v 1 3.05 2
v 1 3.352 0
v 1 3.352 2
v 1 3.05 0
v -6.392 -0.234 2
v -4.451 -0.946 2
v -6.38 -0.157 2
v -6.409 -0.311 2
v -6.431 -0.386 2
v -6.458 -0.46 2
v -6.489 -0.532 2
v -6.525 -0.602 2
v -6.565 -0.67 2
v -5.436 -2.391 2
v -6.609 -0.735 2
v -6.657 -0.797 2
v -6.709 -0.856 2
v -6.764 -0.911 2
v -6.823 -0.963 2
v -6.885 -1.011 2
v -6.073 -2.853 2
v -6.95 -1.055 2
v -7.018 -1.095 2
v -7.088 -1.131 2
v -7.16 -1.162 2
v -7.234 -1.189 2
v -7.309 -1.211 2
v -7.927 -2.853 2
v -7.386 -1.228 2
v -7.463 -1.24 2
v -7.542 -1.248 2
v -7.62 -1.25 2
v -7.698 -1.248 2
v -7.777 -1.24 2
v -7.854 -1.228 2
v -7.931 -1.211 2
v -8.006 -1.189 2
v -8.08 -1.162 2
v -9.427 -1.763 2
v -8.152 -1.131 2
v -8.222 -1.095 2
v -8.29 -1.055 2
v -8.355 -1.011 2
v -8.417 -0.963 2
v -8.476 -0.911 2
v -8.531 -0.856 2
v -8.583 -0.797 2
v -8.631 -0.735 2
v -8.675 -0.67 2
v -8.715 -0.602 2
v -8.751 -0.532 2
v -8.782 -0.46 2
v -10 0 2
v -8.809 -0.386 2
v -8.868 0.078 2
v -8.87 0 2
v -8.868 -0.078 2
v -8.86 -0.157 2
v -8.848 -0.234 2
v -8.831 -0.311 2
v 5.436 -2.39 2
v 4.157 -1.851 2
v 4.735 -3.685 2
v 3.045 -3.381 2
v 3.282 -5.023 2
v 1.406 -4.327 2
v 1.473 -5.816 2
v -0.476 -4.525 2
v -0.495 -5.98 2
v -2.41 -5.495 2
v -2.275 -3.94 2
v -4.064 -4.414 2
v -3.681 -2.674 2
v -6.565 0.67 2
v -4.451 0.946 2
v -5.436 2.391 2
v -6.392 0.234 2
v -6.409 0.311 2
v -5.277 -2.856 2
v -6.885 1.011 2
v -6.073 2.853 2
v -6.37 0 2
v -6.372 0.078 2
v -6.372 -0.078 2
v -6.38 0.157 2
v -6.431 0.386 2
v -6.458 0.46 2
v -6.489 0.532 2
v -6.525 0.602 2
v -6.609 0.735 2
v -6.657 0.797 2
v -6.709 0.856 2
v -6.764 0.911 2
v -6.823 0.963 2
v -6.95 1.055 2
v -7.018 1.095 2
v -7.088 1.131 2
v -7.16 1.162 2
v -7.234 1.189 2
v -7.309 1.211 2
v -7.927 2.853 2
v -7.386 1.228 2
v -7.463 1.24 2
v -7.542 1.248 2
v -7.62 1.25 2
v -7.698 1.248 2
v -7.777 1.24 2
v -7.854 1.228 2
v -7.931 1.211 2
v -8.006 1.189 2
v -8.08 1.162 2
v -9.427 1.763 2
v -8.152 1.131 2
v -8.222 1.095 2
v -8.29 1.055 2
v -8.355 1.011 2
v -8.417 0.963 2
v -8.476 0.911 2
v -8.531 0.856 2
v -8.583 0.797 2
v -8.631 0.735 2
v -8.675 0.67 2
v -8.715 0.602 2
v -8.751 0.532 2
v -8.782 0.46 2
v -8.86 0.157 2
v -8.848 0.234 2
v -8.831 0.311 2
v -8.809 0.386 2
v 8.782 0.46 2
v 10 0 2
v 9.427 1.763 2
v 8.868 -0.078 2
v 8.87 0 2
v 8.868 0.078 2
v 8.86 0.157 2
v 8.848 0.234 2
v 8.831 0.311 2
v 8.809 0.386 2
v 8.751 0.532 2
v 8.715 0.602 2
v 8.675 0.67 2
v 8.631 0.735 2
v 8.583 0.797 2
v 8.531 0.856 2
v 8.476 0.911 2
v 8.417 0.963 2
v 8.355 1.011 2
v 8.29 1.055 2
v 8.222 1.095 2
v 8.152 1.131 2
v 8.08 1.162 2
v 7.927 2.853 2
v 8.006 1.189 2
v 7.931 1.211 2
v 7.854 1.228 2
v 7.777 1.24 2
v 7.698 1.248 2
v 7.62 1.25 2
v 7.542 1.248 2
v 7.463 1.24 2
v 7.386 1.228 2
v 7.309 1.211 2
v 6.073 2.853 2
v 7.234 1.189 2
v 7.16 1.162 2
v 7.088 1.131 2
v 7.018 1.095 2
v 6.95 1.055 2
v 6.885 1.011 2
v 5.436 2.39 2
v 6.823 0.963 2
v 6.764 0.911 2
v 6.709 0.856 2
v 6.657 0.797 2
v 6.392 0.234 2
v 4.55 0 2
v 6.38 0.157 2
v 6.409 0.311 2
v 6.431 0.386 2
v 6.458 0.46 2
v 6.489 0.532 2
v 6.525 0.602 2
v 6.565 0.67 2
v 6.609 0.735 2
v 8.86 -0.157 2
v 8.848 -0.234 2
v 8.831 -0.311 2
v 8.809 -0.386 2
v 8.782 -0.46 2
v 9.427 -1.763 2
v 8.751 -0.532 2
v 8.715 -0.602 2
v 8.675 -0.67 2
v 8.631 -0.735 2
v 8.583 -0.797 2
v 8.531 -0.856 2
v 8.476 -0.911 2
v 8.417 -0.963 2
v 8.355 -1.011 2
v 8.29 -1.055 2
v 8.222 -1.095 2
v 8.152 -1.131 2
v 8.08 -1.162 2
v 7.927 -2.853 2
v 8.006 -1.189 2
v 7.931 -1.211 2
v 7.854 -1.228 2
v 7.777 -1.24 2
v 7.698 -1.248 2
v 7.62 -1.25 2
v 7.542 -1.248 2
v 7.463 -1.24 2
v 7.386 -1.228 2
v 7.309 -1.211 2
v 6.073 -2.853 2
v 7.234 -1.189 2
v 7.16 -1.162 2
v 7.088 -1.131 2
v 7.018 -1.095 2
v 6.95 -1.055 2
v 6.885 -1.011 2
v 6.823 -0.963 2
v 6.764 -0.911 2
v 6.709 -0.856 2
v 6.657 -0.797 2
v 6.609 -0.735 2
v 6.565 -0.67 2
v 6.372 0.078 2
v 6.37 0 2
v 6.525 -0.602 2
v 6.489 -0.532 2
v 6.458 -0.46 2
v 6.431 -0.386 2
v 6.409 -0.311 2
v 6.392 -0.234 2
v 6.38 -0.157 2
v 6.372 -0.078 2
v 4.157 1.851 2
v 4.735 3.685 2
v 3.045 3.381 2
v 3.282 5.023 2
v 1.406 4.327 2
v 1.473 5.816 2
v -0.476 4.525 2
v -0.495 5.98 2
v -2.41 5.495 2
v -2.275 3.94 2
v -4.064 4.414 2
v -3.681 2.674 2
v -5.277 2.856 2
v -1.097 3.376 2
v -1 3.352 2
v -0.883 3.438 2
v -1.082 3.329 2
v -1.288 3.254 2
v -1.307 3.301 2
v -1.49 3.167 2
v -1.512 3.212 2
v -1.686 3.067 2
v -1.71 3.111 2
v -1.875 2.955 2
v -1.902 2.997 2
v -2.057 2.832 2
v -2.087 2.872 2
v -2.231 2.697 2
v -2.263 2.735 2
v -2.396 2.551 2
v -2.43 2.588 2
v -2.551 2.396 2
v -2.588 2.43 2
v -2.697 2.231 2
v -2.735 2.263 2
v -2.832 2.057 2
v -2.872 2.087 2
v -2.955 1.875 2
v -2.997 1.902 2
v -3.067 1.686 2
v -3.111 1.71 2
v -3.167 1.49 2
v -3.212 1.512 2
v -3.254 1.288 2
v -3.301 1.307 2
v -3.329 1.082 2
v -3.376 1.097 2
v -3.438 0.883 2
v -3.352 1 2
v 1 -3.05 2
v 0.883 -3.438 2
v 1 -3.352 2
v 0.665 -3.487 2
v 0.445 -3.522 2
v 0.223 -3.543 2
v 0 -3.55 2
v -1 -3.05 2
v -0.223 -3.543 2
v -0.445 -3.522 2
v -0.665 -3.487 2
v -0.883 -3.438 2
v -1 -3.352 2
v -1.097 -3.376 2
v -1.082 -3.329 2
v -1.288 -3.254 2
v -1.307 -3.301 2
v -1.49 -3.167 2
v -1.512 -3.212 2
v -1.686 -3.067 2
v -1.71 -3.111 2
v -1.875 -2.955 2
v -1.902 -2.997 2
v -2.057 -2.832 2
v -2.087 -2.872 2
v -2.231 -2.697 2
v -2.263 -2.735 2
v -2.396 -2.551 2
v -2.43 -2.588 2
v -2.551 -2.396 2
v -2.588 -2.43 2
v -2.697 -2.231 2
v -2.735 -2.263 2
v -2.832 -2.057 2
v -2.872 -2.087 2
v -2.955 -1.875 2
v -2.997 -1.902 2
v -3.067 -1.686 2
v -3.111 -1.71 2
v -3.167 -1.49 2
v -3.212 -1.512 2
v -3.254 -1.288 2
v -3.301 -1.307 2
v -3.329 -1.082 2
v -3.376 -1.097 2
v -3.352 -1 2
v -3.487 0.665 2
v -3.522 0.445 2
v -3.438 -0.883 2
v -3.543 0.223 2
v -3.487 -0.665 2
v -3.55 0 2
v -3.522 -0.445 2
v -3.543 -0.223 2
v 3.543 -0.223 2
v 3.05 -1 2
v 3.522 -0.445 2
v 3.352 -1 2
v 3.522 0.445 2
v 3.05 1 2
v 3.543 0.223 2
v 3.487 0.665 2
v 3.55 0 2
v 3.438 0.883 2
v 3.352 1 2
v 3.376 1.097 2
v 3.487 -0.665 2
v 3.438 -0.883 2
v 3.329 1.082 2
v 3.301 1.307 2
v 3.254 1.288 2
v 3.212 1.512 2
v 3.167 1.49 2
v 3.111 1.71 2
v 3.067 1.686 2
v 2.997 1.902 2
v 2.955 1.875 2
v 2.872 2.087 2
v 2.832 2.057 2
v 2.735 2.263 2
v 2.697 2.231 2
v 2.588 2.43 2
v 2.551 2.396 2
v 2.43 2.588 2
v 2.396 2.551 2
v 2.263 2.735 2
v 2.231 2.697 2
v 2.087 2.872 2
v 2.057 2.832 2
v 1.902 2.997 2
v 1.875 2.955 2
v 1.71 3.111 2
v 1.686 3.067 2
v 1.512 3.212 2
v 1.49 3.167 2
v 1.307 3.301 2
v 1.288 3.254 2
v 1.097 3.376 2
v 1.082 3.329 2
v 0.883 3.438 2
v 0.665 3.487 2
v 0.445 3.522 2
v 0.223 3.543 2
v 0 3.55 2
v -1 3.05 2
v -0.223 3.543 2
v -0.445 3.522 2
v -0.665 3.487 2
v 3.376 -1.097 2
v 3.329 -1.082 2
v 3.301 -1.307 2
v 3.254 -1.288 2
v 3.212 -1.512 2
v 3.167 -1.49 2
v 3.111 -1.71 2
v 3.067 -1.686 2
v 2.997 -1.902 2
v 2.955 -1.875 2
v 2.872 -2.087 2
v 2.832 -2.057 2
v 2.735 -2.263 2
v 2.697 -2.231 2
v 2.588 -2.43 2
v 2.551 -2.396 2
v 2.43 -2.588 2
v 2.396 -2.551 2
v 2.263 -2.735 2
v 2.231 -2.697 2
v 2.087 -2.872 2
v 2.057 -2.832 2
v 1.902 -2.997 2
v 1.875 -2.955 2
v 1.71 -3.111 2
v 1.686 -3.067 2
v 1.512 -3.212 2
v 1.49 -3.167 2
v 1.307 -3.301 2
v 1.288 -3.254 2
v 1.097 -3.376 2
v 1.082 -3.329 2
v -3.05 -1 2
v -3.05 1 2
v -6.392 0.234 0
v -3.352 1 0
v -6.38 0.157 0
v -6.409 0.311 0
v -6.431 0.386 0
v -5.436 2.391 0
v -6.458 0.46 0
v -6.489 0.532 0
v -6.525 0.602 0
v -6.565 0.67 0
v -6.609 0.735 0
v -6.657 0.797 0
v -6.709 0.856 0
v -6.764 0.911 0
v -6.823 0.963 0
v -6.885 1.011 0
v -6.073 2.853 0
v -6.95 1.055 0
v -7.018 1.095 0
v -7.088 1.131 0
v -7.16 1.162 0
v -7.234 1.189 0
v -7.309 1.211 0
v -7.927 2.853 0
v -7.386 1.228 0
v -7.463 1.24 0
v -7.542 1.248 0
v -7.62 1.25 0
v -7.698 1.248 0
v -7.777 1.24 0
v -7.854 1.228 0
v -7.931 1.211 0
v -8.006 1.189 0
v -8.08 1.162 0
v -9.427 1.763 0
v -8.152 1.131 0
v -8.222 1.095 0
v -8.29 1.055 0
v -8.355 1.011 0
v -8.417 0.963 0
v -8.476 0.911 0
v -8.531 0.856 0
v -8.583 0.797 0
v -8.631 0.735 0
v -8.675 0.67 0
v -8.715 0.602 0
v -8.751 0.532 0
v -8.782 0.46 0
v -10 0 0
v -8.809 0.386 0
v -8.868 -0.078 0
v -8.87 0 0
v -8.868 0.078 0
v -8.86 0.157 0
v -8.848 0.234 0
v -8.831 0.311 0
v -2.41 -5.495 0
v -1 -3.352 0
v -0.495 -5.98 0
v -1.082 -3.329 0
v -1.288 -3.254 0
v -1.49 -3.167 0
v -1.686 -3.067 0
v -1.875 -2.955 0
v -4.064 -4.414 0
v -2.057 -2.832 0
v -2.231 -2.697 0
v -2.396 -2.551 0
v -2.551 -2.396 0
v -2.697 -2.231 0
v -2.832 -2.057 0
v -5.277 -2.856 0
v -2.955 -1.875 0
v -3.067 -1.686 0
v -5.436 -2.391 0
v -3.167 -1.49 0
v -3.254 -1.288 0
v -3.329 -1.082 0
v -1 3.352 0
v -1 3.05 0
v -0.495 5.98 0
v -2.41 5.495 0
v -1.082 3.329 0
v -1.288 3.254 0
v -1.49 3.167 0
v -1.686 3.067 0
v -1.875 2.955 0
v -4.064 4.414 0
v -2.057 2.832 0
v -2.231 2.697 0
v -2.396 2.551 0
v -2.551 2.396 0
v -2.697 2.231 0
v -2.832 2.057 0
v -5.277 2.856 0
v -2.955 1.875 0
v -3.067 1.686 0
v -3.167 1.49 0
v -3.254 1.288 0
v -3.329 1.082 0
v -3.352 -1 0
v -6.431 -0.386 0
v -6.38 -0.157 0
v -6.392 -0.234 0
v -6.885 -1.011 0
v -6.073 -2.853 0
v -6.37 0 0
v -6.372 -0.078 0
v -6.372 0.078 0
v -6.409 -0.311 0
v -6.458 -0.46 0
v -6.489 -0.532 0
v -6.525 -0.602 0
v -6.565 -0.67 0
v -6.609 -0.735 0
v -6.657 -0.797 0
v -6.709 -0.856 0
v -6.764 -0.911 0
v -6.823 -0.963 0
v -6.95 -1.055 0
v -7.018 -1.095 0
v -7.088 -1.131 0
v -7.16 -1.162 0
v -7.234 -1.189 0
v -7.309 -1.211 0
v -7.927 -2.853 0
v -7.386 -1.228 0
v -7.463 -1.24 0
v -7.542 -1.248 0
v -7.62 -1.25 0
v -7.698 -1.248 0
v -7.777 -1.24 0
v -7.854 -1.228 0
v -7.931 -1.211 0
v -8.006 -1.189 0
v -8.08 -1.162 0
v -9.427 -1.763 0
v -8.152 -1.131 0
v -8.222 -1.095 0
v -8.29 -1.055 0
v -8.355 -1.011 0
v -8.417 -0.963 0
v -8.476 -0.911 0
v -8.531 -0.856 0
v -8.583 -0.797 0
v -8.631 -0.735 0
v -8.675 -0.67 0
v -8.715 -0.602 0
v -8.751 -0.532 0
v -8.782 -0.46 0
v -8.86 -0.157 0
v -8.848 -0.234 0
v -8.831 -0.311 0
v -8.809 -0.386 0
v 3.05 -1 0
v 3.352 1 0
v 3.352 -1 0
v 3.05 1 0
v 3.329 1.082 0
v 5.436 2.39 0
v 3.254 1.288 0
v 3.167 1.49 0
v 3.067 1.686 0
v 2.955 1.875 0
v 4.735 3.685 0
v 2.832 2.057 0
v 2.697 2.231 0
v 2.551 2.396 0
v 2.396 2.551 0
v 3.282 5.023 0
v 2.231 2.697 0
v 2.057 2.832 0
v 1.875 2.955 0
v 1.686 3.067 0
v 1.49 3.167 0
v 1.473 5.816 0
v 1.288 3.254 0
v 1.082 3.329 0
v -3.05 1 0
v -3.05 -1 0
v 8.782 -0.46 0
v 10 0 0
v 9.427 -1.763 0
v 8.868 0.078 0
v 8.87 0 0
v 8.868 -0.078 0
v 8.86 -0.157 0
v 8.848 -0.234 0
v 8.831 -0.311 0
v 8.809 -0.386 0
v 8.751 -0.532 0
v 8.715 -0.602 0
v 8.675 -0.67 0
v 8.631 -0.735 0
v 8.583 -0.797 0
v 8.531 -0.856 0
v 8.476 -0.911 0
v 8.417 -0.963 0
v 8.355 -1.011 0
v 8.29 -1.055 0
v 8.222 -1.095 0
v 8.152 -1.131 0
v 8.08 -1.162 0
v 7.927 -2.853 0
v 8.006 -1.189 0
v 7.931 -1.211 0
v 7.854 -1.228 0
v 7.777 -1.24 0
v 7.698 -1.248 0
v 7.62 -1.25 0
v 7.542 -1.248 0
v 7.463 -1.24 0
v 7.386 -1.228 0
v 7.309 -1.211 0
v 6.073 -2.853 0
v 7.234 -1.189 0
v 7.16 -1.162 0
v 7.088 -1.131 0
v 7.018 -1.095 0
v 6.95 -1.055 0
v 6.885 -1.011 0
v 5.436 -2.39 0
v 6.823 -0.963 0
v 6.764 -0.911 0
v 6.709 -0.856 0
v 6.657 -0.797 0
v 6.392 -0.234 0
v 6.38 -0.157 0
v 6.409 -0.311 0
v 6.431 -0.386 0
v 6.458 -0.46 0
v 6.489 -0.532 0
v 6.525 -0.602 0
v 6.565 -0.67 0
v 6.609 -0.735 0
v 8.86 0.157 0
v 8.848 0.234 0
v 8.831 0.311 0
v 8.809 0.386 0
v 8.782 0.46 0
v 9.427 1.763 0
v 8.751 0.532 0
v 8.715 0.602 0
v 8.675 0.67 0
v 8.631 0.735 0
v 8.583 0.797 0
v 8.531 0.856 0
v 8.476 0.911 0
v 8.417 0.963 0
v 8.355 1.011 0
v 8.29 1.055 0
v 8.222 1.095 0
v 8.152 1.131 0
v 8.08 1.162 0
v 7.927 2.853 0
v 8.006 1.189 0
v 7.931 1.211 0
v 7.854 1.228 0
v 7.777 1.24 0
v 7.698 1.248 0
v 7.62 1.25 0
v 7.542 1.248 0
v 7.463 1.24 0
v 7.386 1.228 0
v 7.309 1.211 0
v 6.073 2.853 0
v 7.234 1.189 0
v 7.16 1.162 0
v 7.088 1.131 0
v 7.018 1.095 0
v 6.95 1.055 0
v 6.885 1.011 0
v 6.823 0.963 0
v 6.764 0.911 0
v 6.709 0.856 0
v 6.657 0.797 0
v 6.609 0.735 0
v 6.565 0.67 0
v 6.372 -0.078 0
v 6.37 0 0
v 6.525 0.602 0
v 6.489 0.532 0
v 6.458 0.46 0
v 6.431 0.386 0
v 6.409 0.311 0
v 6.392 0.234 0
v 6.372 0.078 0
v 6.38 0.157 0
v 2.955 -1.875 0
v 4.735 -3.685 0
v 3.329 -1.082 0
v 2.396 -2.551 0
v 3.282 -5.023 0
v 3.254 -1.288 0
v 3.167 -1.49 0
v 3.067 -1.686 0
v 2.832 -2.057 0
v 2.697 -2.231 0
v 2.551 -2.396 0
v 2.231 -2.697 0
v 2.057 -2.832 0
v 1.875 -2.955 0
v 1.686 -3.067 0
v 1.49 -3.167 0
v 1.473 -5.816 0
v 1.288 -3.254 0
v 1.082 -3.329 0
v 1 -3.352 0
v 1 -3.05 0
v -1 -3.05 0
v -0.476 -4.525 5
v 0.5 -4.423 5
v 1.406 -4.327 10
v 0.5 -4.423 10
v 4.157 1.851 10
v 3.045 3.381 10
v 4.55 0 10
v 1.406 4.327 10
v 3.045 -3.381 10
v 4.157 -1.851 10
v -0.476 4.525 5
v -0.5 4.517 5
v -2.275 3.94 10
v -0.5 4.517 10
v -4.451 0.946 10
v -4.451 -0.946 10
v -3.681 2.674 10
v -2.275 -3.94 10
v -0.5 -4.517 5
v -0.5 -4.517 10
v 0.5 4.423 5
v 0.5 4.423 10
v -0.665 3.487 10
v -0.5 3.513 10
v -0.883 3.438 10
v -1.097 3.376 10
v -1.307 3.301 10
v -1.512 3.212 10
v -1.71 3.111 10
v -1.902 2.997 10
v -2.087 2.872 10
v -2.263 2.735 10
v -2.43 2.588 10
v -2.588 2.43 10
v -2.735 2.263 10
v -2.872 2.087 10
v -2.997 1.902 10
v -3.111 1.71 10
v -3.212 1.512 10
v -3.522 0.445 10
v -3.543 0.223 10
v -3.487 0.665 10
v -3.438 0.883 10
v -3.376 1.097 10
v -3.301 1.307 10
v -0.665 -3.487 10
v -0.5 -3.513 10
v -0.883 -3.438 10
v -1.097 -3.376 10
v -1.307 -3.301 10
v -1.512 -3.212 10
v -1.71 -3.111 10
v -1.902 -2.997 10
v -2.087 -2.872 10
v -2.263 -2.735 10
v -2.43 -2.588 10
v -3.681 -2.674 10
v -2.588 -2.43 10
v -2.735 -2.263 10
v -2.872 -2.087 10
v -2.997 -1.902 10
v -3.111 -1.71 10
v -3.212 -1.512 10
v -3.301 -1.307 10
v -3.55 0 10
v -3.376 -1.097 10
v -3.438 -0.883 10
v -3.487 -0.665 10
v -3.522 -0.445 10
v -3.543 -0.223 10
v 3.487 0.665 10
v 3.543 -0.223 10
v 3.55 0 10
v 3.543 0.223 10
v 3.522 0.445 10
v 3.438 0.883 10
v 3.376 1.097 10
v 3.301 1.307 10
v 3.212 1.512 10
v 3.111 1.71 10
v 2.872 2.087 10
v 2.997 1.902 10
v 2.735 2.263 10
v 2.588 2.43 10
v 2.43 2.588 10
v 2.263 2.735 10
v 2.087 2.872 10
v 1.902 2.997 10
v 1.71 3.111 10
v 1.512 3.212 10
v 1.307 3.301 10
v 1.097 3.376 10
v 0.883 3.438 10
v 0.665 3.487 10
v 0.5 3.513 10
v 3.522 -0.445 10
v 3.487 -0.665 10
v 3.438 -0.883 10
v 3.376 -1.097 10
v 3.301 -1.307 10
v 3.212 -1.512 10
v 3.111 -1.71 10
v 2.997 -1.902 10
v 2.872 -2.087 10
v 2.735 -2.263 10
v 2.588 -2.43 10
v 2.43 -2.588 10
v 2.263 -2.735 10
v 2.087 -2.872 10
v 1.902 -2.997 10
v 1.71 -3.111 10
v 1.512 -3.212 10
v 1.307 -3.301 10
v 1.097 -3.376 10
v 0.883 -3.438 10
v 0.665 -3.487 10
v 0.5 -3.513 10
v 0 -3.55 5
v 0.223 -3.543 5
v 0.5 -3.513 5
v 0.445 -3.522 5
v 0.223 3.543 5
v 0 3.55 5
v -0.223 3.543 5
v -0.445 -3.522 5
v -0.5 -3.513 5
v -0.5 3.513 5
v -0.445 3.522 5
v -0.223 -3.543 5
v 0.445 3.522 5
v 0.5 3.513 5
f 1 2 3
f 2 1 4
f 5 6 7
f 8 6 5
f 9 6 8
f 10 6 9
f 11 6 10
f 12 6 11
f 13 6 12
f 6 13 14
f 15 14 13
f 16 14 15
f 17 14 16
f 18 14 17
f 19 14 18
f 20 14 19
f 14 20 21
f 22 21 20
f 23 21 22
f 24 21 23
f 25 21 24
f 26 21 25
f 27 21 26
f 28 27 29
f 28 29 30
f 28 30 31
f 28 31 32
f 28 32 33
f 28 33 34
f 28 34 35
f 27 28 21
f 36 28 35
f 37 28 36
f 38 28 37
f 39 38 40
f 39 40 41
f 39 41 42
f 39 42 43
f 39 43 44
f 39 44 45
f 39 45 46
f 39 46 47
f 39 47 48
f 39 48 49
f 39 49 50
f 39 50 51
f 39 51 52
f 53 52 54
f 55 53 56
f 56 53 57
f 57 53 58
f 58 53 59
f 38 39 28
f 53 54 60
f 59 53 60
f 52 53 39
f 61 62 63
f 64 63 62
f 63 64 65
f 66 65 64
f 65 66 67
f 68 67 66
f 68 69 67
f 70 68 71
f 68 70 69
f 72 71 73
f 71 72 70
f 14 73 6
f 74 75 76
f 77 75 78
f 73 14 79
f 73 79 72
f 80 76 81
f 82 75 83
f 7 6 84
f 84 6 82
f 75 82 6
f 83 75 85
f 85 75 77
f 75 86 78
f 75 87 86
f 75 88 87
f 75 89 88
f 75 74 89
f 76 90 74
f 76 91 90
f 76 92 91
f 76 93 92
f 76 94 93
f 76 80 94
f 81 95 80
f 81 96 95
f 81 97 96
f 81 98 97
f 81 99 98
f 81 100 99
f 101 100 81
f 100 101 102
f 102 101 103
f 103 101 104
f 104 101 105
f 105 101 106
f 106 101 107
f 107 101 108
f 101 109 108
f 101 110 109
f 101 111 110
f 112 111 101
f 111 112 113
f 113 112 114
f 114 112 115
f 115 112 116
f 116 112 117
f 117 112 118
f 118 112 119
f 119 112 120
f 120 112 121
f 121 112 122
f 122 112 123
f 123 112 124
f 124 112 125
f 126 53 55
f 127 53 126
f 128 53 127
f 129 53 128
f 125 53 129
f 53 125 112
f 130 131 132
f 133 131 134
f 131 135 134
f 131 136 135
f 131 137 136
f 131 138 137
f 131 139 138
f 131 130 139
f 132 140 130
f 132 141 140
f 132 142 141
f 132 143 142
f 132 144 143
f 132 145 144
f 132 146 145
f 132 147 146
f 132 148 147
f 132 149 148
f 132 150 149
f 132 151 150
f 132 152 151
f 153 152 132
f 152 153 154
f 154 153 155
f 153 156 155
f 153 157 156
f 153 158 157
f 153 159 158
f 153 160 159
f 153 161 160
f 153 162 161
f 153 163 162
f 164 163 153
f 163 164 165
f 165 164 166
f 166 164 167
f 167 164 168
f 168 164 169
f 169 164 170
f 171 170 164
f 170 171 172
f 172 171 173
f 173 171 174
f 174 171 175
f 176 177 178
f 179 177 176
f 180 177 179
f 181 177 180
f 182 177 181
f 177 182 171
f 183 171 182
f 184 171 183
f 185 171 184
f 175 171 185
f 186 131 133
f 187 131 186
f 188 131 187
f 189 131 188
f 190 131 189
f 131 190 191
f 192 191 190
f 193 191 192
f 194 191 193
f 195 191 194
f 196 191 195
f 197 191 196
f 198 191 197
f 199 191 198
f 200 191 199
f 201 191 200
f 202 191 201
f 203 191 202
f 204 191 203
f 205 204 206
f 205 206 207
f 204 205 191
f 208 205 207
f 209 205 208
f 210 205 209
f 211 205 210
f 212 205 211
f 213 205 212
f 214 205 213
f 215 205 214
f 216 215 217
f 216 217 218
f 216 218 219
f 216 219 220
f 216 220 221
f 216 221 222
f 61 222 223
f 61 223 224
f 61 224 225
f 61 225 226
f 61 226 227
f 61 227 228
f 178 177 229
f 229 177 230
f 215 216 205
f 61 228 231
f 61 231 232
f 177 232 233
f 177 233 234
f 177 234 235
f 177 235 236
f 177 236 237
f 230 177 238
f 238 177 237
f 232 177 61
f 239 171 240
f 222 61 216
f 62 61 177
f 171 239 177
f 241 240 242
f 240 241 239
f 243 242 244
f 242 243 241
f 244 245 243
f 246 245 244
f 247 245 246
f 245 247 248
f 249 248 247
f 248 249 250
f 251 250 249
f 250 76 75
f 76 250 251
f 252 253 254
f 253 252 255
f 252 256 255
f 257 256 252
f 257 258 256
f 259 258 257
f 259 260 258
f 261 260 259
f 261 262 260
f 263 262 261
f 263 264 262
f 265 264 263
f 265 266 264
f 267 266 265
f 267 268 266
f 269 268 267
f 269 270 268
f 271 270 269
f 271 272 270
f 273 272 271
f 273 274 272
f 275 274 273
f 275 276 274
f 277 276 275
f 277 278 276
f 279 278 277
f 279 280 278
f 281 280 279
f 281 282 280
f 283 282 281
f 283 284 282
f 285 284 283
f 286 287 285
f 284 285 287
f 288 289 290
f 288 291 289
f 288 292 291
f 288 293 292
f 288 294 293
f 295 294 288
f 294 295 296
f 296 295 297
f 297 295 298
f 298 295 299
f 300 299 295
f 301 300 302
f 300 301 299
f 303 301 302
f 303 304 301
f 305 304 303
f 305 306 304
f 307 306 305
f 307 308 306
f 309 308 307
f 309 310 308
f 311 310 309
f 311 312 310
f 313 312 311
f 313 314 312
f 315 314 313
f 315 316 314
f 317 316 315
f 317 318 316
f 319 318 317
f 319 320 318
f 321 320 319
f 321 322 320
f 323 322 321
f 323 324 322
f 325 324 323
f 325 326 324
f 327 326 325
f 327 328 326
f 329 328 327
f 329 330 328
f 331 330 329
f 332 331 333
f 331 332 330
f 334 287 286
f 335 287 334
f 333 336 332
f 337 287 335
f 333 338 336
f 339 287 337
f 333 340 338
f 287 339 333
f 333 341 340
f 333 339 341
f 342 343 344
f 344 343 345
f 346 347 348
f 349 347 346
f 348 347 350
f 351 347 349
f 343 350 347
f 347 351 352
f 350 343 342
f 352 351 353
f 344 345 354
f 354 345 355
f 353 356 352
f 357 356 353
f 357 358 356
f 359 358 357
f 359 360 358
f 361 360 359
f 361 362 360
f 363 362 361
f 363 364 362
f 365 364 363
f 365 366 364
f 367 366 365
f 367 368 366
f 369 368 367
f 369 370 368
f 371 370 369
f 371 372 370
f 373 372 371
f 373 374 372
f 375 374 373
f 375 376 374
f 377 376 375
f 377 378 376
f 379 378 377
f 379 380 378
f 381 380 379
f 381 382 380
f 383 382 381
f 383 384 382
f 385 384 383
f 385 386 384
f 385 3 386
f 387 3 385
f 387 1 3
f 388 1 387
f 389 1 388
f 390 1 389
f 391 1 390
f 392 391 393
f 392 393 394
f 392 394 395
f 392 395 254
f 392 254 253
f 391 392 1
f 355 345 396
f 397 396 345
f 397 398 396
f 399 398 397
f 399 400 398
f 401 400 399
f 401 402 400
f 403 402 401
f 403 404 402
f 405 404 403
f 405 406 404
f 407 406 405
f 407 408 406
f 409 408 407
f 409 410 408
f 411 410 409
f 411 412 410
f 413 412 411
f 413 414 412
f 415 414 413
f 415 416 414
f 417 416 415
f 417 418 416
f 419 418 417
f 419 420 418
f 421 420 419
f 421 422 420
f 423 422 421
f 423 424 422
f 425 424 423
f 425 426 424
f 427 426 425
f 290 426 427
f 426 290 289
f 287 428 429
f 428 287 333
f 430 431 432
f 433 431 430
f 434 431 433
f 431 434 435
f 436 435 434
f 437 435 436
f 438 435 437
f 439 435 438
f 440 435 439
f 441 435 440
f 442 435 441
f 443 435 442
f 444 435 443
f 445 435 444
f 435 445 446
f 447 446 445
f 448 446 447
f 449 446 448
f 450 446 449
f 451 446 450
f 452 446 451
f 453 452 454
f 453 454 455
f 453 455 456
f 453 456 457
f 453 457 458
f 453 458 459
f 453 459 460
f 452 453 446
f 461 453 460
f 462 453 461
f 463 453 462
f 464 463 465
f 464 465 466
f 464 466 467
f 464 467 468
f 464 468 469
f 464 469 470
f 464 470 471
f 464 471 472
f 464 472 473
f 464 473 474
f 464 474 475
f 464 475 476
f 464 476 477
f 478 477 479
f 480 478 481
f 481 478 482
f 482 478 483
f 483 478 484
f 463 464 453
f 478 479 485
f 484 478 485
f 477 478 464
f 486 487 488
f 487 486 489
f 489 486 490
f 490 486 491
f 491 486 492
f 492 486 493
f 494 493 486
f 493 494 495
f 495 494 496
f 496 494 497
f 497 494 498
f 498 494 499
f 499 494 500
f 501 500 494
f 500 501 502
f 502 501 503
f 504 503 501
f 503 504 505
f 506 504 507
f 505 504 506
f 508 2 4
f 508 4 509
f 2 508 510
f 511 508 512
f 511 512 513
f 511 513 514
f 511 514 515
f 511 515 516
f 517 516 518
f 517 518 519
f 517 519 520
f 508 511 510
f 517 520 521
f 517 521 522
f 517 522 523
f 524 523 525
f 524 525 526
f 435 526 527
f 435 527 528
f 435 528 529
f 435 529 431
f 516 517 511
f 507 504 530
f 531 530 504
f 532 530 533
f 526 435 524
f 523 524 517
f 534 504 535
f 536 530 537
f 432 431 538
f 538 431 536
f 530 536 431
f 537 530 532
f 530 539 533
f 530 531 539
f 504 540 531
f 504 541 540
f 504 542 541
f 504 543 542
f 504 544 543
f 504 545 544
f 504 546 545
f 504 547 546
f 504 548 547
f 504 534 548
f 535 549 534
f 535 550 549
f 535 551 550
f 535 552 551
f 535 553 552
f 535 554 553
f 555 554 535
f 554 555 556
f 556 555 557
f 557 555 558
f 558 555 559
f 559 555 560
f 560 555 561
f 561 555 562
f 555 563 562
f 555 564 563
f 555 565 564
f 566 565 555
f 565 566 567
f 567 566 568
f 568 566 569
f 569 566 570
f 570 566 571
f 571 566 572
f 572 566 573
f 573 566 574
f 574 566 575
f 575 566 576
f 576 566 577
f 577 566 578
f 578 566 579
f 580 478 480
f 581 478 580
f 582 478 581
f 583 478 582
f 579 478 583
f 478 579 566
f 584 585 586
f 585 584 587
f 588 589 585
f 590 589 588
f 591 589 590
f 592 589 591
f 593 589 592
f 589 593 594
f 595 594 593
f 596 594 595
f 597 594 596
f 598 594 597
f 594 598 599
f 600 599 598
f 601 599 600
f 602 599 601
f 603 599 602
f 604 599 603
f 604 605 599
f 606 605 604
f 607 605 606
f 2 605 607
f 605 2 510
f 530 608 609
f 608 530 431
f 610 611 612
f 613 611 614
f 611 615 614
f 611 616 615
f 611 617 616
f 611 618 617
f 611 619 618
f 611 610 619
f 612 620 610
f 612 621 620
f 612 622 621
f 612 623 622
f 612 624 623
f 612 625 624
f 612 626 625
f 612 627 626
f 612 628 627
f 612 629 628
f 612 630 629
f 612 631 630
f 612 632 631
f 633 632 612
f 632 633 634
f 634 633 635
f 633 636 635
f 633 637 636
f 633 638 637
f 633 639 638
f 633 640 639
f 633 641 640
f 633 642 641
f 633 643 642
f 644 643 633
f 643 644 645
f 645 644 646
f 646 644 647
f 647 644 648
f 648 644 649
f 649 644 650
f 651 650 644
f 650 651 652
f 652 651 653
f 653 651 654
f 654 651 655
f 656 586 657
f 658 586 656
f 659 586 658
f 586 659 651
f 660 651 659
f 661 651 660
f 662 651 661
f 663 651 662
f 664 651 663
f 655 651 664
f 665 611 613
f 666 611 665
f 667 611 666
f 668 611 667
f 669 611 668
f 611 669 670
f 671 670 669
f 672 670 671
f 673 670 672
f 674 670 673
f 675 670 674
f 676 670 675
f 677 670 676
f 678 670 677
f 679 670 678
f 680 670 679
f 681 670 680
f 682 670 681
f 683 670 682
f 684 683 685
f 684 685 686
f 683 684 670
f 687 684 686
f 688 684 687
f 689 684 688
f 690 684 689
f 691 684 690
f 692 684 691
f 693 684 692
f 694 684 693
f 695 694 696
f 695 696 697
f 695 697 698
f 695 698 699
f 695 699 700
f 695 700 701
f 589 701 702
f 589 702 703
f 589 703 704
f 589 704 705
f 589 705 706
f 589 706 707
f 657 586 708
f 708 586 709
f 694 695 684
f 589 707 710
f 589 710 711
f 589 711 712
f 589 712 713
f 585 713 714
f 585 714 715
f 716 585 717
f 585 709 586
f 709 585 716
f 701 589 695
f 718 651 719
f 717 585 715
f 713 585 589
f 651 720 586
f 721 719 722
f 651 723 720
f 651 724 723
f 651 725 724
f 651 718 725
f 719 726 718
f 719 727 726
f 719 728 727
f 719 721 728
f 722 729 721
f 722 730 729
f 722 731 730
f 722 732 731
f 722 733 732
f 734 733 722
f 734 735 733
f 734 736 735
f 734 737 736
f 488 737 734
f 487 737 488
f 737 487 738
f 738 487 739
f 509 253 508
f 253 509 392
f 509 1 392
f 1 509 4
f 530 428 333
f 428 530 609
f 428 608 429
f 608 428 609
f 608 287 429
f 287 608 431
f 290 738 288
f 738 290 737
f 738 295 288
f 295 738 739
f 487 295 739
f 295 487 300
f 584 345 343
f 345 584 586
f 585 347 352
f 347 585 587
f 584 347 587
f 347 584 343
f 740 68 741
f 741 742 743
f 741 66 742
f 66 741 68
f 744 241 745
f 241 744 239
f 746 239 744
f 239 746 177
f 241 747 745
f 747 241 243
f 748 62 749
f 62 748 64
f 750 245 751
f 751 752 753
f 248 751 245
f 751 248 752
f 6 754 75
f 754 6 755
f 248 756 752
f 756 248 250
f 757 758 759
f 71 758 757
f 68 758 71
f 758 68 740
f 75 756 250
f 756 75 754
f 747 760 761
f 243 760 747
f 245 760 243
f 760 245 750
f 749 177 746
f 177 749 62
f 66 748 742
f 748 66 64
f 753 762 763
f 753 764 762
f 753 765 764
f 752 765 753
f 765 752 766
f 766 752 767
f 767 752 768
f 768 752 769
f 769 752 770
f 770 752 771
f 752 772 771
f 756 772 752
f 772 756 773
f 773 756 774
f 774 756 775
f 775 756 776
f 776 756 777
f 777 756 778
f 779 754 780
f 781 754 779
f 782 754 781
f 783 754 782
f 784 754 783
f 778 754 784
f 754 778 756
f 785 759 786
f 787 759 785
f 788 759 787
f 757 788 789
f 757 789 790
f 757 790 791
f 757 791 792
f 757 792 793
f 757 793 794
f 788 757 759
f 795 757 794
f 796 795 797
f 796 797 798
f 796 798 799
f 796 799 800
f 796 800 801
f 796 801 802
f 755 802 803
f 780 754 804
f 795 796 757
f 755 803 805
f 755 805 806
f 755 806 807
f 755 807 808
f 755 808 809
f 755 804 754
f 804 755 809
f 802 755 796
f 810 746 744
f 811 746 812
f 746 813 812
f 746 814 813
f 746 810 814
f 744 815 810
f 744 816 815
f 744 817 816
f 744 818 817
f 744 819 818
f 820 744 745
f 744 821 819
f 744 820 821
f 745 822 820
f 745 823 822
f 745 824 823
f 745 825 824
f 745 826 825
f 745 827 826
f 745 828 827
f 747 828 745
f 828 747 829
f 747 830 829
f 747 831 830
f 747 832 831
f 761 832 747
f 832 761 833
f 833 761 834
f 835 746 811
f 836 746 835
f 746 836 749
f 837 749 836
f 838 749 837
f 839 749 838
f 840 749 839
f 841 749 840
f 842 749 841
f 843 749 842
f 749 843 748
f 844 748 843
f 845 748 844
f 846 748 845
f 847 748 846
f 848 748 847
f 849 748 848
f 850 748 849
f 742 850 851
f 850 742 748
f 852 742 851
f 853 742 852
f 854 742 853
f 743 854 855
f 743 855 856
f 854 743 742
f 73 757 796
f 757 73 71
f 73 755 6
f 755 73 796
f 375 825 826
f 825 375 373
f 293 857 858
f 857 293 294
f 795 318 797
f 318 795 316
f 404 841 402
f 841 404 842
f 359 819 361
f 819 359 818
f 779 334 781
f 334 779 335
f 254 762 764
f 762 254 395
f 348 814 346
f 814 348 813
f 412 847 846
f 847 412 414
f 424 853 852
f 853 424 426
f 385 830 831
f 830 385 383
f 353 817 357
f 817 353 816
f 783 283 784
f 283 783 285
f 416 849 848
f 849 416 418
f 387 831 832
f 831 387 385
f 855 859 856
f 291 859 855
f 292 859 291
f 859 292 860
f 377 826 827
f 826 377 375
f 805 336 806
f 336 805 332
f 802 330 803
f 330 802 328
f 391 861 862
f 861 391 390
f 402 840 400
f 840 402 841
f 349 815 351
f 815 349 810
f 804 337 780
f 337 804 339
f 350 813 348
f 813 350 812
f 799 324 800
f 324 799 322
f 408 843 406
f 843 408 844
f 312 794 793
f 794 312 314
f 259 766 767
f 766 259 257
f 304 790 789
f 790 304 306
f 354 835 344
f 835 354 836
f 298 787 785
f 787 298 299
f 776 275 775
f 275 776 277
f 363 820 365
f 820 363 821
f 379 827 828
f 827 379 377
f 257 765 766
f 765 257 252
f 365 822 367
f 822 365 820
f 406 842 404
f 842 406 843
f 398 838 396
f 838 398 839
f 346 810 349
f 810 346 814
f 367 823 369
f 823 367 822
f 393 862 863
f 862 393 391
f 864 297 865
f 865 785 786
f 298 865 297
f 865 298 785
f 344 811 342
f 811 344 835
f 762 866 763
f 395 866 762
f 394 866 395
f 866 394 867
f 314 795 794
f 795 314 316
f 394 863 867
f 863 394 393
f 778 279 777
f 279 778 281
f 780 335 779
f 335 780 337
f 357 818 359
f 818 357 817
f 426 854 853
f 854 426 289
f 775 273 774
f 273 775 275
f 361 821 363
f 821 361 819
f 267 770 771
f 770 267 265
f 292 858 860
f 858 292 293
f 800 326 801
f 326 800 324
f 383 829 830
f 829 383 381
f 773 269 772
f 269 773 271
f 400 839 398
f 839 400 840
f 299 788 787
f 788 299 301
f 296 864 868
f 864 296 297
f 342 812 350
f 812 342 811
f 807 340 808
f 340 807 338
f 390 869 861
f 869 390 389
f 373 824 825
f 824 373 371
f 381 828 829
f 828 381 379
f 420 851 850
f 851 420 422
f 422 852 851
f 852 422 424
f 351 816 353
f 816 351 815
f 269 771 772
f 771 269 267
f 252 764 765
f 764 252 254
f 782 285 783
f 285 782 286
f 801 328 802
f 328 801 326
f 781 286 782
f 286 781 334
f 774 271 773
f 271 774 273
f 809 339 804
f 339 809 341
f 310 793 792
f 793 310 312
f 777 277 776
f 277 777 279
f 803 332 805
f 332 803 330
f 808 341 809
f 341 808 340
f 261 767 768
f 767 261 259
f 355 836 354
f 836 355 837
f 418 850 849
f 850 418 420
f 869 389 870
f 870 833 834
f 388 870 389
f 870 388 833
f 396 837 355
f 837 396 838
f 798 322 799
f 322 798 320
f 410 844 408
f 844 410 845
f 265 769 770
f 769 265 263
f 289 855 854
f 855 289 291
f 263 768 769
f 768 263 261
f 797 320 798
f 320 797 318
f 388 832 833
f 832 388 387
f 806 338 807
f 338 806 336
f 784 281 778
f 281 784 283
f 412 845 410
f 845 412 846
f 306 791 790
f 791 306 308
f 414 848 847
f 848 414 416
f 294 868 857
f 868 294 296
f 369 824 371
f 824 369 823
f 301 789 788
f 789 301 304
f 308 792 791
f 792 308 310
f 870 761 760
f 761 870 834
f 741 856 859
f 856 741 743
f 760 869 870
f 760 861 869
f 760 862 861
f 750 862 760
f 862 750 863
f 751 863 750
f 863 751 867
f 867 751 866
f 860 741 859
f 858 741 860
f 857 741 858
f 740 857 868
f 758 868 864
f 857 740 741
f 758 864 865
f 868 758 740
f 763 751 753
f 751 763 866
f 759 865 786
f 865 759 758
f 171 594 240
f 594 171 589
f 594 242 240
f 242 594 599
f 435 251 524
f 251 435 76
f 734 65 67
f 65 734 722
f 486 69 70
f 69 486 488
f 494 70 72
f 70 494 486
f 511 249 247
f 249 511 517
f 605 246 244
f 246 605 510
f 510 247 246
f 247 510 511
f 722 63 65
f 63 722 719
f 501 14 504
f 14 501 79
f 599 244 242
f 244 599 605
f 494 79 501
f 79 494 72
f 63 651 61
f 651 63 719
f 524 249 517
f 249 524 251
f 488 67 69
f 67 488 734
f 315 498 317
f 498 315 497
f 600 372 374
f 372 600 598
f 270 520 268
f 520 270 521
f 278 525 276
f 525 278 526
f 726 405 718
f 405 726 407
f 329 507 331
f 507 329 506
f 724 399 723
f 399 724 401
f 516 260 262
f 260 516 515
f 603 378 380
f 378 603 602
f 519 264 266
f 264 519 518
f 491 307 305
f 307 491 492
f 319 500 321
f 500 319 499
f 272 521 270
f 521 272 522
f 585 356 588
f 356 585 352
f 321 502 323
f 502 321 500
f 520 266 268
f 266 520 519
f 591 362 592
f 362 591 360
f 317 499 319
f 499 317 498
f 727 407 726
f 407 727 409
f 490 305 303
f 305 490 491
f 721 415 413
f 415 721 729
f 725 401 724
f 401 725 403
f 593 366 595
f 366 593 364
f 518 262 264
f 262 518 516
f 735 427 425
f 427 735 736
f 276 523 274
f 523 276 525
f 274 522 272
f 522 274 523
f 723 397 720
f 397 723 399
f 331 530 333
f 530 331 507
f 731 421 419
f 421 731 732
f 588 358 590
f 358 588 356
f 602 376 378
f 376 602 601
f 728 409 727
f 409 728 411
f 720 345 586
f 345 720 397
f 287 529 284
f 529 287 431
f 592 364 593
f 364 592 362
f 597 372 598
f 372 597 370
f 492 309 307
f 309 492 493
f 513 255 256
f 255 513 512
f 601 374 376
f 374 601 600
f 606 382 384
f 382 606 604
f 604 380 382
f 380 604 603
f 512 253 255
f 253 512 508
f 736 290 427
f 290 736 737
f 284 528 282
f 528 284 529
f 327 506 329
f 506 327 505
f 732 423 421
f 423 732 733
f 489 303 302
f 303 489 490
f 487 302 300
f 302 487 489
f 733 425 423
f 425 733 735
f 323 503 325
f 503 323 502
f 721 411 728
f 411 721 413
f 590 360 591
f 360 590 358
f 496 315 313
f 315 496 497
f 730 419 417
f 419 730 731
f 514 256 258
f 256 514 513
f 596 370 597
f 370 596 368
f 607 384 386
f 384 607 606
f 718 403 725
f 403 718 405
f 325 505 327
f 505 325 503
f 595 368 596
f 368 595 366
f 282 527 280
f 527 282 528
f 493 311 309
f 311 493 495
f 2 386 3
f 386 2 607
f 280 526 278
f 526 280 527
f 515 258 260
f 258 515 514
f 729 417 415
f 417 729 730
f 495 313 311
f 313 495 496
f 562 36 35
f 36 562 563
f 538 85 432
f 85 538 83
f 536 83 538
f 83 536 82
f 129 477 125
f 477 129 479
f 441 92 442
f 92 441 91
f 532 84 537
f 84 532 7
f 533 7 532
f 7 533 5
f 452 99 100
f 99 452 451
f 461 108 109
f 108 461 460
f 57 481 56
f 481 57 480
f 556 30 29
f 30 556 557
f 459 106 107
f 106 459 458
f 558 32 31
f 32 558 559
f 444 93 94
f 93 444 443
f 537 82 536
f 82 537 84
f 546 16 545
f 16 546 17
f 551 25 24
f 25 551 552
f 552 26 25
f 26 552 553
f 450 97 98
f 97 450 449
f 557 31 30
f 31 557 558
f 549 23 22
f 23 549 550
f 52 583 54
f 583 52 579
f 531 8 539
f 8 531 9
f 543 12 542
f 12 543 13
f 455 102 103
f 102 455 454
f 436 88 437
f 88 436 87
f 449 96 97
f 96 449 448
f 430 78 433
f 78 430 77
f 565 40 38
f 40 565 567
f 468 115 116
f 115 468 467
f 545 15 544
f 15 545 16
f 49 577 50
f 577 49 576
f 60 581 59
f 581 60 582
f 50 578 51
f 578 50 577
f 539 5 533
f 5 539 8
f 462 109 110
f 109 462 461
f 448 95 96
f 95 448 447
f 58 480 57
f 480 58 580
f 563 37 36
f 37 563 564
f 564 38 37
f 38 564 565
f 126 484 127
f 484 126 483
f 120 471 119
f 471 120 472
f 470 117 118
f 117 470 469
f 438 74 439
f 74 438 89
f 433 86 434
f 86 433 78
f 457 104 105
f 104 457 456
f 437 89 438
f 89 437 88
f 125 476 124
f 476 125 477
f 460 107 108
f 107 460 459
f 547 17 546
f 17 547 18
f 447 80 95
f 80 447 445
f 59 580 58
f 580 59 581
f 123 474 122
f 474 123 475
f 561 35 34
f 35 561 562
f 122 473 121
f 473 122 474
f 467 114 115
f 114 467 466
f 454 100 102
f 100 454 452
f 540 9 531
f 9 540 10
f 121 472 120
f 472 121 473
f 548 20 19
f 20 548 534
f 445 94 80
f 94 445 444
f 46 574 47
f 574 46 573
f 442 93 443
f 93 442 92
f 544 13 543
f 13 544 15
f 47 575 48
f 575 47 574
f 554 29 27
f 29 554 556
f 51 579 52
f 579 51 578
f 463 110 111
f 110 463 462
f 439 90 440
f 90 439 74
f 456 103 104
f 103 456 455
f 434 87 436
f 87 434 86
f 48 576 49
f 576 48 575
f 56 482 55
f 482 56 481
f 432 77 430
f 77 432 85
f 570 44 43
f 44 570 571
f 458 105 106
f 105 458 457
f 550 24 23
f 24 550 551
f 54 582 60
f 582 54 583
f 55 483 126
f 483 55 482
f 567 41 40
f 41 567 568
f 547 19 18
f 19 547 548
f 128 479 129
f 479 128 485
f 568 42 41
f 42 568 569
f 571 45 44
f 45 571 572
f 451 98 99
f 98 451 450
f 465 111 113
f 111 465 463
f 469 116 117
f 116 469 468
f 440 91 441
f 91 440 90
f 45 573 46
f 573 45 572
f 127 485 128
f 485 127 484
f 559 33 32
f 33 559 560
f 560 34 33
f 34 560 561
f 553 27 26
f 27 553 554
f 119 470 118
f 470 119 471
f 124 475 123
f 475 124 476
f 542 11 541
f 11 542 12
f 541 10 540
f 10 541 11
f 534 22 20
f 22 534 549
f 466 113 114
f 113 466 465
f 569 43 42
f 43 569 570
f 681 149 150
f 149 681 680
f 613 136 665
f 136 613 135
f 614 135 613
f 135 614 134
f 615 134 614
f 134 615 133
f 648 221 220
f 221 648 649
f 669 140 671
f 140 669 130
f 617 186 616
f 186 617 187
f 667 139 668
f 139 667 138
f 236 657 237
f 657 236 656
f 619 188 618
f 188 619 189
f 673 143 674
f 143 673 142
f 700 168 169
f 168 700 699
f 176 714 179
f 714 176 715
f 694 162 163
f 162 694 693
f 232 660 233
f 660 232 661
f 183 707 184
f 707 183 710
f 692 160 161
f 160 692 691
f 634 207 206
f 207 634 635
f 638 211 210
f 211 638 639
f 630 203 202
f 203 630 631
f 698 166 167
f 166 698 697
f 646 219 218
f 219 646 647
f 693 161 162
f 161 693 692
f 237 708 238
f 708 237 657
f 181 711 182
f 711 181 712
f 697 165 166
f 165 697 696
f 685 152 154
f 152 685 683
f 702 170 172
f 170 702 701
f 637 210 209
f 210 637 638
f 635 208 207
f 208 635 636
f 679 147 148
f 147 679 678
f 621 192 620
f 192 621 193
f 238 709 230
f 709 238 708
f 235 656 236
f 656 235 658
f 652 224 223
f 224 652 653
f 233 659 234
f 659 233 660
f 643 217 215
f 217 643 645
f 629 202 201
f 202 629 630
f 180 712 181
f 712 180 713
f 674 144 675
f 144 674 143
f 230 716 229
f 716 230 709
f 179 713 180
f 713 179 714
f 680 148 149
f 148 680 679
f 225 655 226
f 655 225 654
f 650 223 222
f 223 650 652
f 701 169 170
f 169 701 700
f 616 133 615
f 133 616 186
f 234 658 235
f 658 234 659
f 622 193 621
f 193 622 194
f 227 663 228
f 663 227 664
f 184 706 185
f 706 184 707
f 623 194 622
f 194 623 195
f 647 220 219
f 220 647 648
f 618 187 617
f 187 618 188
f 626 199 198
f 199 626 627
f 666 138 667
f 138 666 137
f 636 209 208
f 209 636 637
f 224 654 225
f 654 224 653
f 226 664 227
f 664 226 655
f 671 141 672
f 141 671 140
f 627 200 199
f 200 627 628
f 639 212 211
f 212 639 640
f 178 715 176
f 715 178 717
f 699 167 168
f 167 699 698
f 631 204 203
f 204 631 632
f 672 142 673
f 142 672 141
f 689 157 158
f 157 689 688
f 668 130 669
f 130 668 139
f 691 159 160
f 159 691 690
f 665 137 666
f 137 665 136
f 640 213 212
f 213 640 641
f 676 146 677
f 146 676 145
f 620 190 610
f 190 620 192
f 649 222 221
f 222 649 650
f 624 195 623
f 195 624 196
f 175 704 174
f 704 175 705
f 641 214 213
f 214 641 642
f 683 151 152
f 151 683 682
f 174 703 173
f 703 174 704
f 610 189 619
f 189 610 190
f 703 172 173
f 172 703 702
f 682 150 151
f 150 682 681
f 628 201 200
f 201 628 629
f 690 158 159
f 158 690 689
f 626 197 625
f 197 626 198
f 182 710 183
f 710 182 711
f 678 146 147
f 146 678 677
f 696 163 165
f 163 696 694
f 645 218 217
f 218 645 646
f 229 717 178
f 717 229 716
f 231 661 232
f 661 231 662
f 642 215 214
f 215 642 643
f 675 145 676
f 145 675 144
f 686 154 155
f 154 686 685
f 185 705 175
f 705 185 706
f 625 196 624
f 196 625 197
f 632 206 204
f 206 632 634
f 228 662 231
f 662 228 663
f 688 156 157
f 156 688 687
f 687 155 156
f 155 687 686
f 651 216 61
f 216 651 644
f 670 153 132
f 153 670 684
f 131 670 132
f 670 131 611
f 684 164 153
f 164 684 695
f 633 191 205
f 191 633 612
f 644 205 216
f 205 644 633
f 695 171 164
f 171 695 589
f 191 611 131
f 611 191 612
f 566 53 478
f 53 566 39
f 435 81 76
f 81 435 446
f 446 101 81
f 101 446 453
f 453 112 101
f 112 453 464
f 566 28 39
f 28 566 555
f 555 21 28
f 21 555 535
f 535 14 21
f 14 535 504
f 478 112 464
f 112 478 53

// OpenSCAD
//By http://www.thingiverse.com/Paintballmagic



motor_size = 7.0;
motor_hole_modifier_percentage = 1.0;
wall_thickness = 1.0;  
base_height = 2.0;  
support_hole = 7.0;  
tower_height = 10.0;  
tower_support_diameter = 12.0;
groove_size = 8.65;
tower_grove_height = 0.0;  
screw_holes_diameter = 2.5;  
screw_base_diameter = 4.0;
screw_base_height = 2.0;  
screw_support_base_width = 6.0; 
screw_holes_radius = 7.62;  
screw_holes_connector_radius =7.0;
notch = 1; // [0,1]
notch_depth=5;
pillars = 4;
pillar_height = 2.0;
pillar_width = 2.0;
pillar_length = 2.0; 
pillar_inset = 0.5;
pillar_z_offset = 0.0;

// No need to modify below this line. Anything adjustable is listed in the aboveglobal veriables.

module example001()
{

for ( i = [0 : pillars-1] )
{

  rotate(a= i* 360/pillars, v=[0,0,1]) 
translate([0,motor_size/2+pillar_length/2-pillar_inset,pillar_height/2+pillar_z_offset ])
cube(size = [pillar_length,pillar_width,pillar_height], center = true);
}


motor_size = motor_size +(motor_hole_modifier_percentage*.1);
if (notch == 0){
difference() {
cylinder(h = tower_height, r=motor_size/2+ wall_thickness );     
cylinder (h = tower_height*4, r=motor_size/2, center = true, $fn=100);

}
}
if (notch == 1){

difference() {
translate([0,0,base_height + tower_grove_height ])
cylinder(h = tower_height -(base_height + tower_grove_height), r=motor_size/2+ wall_thickness  );     
cylinder (h = tower_height*4, r=motor_size/2, center = true, $fn=100);
translate([0,0,tower_height-notch_depth + (tower_height/2)])
cube(size = [1,20,tower_height], center = true);

}

}




difference() {
cylinder(h = base_height, r=tower_support_diameter/2);   
cylinder (h = tower_height, r=support_hole/2, center = true, $fn=100);
} 

if(tower_grove_height > 0 )
{
difference() {
translate([0,0,base_height + tower_grove_height ])
cylinder(h = base_height, r=tower_support_diameter/2);   
cylinder (h = tower_height, r=motor_size/2, center = true, $fn=100);
} 
}

difference() {
translate([-screw_holes_radius,0,0]) 
cylinder(h = base_height, r=screw_base_diameter/2);
translate([-screw_holes_radius,0,0]) cylinder(h = tower_height, r=screw_holes_diameter/2, center = true, $fn=100);

}

difference() {
translate([screw_holes_radius,0,0]) 
cylinder(h = base_height, r=screw_base_diameter/2);
translate([screw_holes_radius,0,0]) cylinder(h = tower_height, r=screw_holes_diameter/2, center = true, $fn=100);

}

difference() {
translate([screw_holes_connector_radius,0,0]) 
cylinder(h = screw_base_height, r=screw_support_base_width/2);
translate([screw_holes_radius,0,0]) cylinder(h = tower_height, r=screw_holes_diameter/2, center = true, $fn=100);

}

difference() {
translate([-screw_holes_connector_radius,0,0]) 
cylinder(h = screw_base_height, r=screw_support_base_width/2);
translate([-screw_holes_radius,0,0]) cylinder(h = tower_height, r=screw_holes_diameter/2, center = true, $fn=100);

}


difference() {
translate([0,0,base_height ])
cylinder(h = tower_grove_height, r=groove_size/2);
   
cylinder (h = tower_height+1, r=motor_size/2, center = true, $fn=100);
} 

}

example001();

string = motor_size +(motor_hole_modifier_percentage*.1);
echo ("<p> Actual part inner diameter" ,string , "<br><br> Motor diameter", motor_size , "</p>");
